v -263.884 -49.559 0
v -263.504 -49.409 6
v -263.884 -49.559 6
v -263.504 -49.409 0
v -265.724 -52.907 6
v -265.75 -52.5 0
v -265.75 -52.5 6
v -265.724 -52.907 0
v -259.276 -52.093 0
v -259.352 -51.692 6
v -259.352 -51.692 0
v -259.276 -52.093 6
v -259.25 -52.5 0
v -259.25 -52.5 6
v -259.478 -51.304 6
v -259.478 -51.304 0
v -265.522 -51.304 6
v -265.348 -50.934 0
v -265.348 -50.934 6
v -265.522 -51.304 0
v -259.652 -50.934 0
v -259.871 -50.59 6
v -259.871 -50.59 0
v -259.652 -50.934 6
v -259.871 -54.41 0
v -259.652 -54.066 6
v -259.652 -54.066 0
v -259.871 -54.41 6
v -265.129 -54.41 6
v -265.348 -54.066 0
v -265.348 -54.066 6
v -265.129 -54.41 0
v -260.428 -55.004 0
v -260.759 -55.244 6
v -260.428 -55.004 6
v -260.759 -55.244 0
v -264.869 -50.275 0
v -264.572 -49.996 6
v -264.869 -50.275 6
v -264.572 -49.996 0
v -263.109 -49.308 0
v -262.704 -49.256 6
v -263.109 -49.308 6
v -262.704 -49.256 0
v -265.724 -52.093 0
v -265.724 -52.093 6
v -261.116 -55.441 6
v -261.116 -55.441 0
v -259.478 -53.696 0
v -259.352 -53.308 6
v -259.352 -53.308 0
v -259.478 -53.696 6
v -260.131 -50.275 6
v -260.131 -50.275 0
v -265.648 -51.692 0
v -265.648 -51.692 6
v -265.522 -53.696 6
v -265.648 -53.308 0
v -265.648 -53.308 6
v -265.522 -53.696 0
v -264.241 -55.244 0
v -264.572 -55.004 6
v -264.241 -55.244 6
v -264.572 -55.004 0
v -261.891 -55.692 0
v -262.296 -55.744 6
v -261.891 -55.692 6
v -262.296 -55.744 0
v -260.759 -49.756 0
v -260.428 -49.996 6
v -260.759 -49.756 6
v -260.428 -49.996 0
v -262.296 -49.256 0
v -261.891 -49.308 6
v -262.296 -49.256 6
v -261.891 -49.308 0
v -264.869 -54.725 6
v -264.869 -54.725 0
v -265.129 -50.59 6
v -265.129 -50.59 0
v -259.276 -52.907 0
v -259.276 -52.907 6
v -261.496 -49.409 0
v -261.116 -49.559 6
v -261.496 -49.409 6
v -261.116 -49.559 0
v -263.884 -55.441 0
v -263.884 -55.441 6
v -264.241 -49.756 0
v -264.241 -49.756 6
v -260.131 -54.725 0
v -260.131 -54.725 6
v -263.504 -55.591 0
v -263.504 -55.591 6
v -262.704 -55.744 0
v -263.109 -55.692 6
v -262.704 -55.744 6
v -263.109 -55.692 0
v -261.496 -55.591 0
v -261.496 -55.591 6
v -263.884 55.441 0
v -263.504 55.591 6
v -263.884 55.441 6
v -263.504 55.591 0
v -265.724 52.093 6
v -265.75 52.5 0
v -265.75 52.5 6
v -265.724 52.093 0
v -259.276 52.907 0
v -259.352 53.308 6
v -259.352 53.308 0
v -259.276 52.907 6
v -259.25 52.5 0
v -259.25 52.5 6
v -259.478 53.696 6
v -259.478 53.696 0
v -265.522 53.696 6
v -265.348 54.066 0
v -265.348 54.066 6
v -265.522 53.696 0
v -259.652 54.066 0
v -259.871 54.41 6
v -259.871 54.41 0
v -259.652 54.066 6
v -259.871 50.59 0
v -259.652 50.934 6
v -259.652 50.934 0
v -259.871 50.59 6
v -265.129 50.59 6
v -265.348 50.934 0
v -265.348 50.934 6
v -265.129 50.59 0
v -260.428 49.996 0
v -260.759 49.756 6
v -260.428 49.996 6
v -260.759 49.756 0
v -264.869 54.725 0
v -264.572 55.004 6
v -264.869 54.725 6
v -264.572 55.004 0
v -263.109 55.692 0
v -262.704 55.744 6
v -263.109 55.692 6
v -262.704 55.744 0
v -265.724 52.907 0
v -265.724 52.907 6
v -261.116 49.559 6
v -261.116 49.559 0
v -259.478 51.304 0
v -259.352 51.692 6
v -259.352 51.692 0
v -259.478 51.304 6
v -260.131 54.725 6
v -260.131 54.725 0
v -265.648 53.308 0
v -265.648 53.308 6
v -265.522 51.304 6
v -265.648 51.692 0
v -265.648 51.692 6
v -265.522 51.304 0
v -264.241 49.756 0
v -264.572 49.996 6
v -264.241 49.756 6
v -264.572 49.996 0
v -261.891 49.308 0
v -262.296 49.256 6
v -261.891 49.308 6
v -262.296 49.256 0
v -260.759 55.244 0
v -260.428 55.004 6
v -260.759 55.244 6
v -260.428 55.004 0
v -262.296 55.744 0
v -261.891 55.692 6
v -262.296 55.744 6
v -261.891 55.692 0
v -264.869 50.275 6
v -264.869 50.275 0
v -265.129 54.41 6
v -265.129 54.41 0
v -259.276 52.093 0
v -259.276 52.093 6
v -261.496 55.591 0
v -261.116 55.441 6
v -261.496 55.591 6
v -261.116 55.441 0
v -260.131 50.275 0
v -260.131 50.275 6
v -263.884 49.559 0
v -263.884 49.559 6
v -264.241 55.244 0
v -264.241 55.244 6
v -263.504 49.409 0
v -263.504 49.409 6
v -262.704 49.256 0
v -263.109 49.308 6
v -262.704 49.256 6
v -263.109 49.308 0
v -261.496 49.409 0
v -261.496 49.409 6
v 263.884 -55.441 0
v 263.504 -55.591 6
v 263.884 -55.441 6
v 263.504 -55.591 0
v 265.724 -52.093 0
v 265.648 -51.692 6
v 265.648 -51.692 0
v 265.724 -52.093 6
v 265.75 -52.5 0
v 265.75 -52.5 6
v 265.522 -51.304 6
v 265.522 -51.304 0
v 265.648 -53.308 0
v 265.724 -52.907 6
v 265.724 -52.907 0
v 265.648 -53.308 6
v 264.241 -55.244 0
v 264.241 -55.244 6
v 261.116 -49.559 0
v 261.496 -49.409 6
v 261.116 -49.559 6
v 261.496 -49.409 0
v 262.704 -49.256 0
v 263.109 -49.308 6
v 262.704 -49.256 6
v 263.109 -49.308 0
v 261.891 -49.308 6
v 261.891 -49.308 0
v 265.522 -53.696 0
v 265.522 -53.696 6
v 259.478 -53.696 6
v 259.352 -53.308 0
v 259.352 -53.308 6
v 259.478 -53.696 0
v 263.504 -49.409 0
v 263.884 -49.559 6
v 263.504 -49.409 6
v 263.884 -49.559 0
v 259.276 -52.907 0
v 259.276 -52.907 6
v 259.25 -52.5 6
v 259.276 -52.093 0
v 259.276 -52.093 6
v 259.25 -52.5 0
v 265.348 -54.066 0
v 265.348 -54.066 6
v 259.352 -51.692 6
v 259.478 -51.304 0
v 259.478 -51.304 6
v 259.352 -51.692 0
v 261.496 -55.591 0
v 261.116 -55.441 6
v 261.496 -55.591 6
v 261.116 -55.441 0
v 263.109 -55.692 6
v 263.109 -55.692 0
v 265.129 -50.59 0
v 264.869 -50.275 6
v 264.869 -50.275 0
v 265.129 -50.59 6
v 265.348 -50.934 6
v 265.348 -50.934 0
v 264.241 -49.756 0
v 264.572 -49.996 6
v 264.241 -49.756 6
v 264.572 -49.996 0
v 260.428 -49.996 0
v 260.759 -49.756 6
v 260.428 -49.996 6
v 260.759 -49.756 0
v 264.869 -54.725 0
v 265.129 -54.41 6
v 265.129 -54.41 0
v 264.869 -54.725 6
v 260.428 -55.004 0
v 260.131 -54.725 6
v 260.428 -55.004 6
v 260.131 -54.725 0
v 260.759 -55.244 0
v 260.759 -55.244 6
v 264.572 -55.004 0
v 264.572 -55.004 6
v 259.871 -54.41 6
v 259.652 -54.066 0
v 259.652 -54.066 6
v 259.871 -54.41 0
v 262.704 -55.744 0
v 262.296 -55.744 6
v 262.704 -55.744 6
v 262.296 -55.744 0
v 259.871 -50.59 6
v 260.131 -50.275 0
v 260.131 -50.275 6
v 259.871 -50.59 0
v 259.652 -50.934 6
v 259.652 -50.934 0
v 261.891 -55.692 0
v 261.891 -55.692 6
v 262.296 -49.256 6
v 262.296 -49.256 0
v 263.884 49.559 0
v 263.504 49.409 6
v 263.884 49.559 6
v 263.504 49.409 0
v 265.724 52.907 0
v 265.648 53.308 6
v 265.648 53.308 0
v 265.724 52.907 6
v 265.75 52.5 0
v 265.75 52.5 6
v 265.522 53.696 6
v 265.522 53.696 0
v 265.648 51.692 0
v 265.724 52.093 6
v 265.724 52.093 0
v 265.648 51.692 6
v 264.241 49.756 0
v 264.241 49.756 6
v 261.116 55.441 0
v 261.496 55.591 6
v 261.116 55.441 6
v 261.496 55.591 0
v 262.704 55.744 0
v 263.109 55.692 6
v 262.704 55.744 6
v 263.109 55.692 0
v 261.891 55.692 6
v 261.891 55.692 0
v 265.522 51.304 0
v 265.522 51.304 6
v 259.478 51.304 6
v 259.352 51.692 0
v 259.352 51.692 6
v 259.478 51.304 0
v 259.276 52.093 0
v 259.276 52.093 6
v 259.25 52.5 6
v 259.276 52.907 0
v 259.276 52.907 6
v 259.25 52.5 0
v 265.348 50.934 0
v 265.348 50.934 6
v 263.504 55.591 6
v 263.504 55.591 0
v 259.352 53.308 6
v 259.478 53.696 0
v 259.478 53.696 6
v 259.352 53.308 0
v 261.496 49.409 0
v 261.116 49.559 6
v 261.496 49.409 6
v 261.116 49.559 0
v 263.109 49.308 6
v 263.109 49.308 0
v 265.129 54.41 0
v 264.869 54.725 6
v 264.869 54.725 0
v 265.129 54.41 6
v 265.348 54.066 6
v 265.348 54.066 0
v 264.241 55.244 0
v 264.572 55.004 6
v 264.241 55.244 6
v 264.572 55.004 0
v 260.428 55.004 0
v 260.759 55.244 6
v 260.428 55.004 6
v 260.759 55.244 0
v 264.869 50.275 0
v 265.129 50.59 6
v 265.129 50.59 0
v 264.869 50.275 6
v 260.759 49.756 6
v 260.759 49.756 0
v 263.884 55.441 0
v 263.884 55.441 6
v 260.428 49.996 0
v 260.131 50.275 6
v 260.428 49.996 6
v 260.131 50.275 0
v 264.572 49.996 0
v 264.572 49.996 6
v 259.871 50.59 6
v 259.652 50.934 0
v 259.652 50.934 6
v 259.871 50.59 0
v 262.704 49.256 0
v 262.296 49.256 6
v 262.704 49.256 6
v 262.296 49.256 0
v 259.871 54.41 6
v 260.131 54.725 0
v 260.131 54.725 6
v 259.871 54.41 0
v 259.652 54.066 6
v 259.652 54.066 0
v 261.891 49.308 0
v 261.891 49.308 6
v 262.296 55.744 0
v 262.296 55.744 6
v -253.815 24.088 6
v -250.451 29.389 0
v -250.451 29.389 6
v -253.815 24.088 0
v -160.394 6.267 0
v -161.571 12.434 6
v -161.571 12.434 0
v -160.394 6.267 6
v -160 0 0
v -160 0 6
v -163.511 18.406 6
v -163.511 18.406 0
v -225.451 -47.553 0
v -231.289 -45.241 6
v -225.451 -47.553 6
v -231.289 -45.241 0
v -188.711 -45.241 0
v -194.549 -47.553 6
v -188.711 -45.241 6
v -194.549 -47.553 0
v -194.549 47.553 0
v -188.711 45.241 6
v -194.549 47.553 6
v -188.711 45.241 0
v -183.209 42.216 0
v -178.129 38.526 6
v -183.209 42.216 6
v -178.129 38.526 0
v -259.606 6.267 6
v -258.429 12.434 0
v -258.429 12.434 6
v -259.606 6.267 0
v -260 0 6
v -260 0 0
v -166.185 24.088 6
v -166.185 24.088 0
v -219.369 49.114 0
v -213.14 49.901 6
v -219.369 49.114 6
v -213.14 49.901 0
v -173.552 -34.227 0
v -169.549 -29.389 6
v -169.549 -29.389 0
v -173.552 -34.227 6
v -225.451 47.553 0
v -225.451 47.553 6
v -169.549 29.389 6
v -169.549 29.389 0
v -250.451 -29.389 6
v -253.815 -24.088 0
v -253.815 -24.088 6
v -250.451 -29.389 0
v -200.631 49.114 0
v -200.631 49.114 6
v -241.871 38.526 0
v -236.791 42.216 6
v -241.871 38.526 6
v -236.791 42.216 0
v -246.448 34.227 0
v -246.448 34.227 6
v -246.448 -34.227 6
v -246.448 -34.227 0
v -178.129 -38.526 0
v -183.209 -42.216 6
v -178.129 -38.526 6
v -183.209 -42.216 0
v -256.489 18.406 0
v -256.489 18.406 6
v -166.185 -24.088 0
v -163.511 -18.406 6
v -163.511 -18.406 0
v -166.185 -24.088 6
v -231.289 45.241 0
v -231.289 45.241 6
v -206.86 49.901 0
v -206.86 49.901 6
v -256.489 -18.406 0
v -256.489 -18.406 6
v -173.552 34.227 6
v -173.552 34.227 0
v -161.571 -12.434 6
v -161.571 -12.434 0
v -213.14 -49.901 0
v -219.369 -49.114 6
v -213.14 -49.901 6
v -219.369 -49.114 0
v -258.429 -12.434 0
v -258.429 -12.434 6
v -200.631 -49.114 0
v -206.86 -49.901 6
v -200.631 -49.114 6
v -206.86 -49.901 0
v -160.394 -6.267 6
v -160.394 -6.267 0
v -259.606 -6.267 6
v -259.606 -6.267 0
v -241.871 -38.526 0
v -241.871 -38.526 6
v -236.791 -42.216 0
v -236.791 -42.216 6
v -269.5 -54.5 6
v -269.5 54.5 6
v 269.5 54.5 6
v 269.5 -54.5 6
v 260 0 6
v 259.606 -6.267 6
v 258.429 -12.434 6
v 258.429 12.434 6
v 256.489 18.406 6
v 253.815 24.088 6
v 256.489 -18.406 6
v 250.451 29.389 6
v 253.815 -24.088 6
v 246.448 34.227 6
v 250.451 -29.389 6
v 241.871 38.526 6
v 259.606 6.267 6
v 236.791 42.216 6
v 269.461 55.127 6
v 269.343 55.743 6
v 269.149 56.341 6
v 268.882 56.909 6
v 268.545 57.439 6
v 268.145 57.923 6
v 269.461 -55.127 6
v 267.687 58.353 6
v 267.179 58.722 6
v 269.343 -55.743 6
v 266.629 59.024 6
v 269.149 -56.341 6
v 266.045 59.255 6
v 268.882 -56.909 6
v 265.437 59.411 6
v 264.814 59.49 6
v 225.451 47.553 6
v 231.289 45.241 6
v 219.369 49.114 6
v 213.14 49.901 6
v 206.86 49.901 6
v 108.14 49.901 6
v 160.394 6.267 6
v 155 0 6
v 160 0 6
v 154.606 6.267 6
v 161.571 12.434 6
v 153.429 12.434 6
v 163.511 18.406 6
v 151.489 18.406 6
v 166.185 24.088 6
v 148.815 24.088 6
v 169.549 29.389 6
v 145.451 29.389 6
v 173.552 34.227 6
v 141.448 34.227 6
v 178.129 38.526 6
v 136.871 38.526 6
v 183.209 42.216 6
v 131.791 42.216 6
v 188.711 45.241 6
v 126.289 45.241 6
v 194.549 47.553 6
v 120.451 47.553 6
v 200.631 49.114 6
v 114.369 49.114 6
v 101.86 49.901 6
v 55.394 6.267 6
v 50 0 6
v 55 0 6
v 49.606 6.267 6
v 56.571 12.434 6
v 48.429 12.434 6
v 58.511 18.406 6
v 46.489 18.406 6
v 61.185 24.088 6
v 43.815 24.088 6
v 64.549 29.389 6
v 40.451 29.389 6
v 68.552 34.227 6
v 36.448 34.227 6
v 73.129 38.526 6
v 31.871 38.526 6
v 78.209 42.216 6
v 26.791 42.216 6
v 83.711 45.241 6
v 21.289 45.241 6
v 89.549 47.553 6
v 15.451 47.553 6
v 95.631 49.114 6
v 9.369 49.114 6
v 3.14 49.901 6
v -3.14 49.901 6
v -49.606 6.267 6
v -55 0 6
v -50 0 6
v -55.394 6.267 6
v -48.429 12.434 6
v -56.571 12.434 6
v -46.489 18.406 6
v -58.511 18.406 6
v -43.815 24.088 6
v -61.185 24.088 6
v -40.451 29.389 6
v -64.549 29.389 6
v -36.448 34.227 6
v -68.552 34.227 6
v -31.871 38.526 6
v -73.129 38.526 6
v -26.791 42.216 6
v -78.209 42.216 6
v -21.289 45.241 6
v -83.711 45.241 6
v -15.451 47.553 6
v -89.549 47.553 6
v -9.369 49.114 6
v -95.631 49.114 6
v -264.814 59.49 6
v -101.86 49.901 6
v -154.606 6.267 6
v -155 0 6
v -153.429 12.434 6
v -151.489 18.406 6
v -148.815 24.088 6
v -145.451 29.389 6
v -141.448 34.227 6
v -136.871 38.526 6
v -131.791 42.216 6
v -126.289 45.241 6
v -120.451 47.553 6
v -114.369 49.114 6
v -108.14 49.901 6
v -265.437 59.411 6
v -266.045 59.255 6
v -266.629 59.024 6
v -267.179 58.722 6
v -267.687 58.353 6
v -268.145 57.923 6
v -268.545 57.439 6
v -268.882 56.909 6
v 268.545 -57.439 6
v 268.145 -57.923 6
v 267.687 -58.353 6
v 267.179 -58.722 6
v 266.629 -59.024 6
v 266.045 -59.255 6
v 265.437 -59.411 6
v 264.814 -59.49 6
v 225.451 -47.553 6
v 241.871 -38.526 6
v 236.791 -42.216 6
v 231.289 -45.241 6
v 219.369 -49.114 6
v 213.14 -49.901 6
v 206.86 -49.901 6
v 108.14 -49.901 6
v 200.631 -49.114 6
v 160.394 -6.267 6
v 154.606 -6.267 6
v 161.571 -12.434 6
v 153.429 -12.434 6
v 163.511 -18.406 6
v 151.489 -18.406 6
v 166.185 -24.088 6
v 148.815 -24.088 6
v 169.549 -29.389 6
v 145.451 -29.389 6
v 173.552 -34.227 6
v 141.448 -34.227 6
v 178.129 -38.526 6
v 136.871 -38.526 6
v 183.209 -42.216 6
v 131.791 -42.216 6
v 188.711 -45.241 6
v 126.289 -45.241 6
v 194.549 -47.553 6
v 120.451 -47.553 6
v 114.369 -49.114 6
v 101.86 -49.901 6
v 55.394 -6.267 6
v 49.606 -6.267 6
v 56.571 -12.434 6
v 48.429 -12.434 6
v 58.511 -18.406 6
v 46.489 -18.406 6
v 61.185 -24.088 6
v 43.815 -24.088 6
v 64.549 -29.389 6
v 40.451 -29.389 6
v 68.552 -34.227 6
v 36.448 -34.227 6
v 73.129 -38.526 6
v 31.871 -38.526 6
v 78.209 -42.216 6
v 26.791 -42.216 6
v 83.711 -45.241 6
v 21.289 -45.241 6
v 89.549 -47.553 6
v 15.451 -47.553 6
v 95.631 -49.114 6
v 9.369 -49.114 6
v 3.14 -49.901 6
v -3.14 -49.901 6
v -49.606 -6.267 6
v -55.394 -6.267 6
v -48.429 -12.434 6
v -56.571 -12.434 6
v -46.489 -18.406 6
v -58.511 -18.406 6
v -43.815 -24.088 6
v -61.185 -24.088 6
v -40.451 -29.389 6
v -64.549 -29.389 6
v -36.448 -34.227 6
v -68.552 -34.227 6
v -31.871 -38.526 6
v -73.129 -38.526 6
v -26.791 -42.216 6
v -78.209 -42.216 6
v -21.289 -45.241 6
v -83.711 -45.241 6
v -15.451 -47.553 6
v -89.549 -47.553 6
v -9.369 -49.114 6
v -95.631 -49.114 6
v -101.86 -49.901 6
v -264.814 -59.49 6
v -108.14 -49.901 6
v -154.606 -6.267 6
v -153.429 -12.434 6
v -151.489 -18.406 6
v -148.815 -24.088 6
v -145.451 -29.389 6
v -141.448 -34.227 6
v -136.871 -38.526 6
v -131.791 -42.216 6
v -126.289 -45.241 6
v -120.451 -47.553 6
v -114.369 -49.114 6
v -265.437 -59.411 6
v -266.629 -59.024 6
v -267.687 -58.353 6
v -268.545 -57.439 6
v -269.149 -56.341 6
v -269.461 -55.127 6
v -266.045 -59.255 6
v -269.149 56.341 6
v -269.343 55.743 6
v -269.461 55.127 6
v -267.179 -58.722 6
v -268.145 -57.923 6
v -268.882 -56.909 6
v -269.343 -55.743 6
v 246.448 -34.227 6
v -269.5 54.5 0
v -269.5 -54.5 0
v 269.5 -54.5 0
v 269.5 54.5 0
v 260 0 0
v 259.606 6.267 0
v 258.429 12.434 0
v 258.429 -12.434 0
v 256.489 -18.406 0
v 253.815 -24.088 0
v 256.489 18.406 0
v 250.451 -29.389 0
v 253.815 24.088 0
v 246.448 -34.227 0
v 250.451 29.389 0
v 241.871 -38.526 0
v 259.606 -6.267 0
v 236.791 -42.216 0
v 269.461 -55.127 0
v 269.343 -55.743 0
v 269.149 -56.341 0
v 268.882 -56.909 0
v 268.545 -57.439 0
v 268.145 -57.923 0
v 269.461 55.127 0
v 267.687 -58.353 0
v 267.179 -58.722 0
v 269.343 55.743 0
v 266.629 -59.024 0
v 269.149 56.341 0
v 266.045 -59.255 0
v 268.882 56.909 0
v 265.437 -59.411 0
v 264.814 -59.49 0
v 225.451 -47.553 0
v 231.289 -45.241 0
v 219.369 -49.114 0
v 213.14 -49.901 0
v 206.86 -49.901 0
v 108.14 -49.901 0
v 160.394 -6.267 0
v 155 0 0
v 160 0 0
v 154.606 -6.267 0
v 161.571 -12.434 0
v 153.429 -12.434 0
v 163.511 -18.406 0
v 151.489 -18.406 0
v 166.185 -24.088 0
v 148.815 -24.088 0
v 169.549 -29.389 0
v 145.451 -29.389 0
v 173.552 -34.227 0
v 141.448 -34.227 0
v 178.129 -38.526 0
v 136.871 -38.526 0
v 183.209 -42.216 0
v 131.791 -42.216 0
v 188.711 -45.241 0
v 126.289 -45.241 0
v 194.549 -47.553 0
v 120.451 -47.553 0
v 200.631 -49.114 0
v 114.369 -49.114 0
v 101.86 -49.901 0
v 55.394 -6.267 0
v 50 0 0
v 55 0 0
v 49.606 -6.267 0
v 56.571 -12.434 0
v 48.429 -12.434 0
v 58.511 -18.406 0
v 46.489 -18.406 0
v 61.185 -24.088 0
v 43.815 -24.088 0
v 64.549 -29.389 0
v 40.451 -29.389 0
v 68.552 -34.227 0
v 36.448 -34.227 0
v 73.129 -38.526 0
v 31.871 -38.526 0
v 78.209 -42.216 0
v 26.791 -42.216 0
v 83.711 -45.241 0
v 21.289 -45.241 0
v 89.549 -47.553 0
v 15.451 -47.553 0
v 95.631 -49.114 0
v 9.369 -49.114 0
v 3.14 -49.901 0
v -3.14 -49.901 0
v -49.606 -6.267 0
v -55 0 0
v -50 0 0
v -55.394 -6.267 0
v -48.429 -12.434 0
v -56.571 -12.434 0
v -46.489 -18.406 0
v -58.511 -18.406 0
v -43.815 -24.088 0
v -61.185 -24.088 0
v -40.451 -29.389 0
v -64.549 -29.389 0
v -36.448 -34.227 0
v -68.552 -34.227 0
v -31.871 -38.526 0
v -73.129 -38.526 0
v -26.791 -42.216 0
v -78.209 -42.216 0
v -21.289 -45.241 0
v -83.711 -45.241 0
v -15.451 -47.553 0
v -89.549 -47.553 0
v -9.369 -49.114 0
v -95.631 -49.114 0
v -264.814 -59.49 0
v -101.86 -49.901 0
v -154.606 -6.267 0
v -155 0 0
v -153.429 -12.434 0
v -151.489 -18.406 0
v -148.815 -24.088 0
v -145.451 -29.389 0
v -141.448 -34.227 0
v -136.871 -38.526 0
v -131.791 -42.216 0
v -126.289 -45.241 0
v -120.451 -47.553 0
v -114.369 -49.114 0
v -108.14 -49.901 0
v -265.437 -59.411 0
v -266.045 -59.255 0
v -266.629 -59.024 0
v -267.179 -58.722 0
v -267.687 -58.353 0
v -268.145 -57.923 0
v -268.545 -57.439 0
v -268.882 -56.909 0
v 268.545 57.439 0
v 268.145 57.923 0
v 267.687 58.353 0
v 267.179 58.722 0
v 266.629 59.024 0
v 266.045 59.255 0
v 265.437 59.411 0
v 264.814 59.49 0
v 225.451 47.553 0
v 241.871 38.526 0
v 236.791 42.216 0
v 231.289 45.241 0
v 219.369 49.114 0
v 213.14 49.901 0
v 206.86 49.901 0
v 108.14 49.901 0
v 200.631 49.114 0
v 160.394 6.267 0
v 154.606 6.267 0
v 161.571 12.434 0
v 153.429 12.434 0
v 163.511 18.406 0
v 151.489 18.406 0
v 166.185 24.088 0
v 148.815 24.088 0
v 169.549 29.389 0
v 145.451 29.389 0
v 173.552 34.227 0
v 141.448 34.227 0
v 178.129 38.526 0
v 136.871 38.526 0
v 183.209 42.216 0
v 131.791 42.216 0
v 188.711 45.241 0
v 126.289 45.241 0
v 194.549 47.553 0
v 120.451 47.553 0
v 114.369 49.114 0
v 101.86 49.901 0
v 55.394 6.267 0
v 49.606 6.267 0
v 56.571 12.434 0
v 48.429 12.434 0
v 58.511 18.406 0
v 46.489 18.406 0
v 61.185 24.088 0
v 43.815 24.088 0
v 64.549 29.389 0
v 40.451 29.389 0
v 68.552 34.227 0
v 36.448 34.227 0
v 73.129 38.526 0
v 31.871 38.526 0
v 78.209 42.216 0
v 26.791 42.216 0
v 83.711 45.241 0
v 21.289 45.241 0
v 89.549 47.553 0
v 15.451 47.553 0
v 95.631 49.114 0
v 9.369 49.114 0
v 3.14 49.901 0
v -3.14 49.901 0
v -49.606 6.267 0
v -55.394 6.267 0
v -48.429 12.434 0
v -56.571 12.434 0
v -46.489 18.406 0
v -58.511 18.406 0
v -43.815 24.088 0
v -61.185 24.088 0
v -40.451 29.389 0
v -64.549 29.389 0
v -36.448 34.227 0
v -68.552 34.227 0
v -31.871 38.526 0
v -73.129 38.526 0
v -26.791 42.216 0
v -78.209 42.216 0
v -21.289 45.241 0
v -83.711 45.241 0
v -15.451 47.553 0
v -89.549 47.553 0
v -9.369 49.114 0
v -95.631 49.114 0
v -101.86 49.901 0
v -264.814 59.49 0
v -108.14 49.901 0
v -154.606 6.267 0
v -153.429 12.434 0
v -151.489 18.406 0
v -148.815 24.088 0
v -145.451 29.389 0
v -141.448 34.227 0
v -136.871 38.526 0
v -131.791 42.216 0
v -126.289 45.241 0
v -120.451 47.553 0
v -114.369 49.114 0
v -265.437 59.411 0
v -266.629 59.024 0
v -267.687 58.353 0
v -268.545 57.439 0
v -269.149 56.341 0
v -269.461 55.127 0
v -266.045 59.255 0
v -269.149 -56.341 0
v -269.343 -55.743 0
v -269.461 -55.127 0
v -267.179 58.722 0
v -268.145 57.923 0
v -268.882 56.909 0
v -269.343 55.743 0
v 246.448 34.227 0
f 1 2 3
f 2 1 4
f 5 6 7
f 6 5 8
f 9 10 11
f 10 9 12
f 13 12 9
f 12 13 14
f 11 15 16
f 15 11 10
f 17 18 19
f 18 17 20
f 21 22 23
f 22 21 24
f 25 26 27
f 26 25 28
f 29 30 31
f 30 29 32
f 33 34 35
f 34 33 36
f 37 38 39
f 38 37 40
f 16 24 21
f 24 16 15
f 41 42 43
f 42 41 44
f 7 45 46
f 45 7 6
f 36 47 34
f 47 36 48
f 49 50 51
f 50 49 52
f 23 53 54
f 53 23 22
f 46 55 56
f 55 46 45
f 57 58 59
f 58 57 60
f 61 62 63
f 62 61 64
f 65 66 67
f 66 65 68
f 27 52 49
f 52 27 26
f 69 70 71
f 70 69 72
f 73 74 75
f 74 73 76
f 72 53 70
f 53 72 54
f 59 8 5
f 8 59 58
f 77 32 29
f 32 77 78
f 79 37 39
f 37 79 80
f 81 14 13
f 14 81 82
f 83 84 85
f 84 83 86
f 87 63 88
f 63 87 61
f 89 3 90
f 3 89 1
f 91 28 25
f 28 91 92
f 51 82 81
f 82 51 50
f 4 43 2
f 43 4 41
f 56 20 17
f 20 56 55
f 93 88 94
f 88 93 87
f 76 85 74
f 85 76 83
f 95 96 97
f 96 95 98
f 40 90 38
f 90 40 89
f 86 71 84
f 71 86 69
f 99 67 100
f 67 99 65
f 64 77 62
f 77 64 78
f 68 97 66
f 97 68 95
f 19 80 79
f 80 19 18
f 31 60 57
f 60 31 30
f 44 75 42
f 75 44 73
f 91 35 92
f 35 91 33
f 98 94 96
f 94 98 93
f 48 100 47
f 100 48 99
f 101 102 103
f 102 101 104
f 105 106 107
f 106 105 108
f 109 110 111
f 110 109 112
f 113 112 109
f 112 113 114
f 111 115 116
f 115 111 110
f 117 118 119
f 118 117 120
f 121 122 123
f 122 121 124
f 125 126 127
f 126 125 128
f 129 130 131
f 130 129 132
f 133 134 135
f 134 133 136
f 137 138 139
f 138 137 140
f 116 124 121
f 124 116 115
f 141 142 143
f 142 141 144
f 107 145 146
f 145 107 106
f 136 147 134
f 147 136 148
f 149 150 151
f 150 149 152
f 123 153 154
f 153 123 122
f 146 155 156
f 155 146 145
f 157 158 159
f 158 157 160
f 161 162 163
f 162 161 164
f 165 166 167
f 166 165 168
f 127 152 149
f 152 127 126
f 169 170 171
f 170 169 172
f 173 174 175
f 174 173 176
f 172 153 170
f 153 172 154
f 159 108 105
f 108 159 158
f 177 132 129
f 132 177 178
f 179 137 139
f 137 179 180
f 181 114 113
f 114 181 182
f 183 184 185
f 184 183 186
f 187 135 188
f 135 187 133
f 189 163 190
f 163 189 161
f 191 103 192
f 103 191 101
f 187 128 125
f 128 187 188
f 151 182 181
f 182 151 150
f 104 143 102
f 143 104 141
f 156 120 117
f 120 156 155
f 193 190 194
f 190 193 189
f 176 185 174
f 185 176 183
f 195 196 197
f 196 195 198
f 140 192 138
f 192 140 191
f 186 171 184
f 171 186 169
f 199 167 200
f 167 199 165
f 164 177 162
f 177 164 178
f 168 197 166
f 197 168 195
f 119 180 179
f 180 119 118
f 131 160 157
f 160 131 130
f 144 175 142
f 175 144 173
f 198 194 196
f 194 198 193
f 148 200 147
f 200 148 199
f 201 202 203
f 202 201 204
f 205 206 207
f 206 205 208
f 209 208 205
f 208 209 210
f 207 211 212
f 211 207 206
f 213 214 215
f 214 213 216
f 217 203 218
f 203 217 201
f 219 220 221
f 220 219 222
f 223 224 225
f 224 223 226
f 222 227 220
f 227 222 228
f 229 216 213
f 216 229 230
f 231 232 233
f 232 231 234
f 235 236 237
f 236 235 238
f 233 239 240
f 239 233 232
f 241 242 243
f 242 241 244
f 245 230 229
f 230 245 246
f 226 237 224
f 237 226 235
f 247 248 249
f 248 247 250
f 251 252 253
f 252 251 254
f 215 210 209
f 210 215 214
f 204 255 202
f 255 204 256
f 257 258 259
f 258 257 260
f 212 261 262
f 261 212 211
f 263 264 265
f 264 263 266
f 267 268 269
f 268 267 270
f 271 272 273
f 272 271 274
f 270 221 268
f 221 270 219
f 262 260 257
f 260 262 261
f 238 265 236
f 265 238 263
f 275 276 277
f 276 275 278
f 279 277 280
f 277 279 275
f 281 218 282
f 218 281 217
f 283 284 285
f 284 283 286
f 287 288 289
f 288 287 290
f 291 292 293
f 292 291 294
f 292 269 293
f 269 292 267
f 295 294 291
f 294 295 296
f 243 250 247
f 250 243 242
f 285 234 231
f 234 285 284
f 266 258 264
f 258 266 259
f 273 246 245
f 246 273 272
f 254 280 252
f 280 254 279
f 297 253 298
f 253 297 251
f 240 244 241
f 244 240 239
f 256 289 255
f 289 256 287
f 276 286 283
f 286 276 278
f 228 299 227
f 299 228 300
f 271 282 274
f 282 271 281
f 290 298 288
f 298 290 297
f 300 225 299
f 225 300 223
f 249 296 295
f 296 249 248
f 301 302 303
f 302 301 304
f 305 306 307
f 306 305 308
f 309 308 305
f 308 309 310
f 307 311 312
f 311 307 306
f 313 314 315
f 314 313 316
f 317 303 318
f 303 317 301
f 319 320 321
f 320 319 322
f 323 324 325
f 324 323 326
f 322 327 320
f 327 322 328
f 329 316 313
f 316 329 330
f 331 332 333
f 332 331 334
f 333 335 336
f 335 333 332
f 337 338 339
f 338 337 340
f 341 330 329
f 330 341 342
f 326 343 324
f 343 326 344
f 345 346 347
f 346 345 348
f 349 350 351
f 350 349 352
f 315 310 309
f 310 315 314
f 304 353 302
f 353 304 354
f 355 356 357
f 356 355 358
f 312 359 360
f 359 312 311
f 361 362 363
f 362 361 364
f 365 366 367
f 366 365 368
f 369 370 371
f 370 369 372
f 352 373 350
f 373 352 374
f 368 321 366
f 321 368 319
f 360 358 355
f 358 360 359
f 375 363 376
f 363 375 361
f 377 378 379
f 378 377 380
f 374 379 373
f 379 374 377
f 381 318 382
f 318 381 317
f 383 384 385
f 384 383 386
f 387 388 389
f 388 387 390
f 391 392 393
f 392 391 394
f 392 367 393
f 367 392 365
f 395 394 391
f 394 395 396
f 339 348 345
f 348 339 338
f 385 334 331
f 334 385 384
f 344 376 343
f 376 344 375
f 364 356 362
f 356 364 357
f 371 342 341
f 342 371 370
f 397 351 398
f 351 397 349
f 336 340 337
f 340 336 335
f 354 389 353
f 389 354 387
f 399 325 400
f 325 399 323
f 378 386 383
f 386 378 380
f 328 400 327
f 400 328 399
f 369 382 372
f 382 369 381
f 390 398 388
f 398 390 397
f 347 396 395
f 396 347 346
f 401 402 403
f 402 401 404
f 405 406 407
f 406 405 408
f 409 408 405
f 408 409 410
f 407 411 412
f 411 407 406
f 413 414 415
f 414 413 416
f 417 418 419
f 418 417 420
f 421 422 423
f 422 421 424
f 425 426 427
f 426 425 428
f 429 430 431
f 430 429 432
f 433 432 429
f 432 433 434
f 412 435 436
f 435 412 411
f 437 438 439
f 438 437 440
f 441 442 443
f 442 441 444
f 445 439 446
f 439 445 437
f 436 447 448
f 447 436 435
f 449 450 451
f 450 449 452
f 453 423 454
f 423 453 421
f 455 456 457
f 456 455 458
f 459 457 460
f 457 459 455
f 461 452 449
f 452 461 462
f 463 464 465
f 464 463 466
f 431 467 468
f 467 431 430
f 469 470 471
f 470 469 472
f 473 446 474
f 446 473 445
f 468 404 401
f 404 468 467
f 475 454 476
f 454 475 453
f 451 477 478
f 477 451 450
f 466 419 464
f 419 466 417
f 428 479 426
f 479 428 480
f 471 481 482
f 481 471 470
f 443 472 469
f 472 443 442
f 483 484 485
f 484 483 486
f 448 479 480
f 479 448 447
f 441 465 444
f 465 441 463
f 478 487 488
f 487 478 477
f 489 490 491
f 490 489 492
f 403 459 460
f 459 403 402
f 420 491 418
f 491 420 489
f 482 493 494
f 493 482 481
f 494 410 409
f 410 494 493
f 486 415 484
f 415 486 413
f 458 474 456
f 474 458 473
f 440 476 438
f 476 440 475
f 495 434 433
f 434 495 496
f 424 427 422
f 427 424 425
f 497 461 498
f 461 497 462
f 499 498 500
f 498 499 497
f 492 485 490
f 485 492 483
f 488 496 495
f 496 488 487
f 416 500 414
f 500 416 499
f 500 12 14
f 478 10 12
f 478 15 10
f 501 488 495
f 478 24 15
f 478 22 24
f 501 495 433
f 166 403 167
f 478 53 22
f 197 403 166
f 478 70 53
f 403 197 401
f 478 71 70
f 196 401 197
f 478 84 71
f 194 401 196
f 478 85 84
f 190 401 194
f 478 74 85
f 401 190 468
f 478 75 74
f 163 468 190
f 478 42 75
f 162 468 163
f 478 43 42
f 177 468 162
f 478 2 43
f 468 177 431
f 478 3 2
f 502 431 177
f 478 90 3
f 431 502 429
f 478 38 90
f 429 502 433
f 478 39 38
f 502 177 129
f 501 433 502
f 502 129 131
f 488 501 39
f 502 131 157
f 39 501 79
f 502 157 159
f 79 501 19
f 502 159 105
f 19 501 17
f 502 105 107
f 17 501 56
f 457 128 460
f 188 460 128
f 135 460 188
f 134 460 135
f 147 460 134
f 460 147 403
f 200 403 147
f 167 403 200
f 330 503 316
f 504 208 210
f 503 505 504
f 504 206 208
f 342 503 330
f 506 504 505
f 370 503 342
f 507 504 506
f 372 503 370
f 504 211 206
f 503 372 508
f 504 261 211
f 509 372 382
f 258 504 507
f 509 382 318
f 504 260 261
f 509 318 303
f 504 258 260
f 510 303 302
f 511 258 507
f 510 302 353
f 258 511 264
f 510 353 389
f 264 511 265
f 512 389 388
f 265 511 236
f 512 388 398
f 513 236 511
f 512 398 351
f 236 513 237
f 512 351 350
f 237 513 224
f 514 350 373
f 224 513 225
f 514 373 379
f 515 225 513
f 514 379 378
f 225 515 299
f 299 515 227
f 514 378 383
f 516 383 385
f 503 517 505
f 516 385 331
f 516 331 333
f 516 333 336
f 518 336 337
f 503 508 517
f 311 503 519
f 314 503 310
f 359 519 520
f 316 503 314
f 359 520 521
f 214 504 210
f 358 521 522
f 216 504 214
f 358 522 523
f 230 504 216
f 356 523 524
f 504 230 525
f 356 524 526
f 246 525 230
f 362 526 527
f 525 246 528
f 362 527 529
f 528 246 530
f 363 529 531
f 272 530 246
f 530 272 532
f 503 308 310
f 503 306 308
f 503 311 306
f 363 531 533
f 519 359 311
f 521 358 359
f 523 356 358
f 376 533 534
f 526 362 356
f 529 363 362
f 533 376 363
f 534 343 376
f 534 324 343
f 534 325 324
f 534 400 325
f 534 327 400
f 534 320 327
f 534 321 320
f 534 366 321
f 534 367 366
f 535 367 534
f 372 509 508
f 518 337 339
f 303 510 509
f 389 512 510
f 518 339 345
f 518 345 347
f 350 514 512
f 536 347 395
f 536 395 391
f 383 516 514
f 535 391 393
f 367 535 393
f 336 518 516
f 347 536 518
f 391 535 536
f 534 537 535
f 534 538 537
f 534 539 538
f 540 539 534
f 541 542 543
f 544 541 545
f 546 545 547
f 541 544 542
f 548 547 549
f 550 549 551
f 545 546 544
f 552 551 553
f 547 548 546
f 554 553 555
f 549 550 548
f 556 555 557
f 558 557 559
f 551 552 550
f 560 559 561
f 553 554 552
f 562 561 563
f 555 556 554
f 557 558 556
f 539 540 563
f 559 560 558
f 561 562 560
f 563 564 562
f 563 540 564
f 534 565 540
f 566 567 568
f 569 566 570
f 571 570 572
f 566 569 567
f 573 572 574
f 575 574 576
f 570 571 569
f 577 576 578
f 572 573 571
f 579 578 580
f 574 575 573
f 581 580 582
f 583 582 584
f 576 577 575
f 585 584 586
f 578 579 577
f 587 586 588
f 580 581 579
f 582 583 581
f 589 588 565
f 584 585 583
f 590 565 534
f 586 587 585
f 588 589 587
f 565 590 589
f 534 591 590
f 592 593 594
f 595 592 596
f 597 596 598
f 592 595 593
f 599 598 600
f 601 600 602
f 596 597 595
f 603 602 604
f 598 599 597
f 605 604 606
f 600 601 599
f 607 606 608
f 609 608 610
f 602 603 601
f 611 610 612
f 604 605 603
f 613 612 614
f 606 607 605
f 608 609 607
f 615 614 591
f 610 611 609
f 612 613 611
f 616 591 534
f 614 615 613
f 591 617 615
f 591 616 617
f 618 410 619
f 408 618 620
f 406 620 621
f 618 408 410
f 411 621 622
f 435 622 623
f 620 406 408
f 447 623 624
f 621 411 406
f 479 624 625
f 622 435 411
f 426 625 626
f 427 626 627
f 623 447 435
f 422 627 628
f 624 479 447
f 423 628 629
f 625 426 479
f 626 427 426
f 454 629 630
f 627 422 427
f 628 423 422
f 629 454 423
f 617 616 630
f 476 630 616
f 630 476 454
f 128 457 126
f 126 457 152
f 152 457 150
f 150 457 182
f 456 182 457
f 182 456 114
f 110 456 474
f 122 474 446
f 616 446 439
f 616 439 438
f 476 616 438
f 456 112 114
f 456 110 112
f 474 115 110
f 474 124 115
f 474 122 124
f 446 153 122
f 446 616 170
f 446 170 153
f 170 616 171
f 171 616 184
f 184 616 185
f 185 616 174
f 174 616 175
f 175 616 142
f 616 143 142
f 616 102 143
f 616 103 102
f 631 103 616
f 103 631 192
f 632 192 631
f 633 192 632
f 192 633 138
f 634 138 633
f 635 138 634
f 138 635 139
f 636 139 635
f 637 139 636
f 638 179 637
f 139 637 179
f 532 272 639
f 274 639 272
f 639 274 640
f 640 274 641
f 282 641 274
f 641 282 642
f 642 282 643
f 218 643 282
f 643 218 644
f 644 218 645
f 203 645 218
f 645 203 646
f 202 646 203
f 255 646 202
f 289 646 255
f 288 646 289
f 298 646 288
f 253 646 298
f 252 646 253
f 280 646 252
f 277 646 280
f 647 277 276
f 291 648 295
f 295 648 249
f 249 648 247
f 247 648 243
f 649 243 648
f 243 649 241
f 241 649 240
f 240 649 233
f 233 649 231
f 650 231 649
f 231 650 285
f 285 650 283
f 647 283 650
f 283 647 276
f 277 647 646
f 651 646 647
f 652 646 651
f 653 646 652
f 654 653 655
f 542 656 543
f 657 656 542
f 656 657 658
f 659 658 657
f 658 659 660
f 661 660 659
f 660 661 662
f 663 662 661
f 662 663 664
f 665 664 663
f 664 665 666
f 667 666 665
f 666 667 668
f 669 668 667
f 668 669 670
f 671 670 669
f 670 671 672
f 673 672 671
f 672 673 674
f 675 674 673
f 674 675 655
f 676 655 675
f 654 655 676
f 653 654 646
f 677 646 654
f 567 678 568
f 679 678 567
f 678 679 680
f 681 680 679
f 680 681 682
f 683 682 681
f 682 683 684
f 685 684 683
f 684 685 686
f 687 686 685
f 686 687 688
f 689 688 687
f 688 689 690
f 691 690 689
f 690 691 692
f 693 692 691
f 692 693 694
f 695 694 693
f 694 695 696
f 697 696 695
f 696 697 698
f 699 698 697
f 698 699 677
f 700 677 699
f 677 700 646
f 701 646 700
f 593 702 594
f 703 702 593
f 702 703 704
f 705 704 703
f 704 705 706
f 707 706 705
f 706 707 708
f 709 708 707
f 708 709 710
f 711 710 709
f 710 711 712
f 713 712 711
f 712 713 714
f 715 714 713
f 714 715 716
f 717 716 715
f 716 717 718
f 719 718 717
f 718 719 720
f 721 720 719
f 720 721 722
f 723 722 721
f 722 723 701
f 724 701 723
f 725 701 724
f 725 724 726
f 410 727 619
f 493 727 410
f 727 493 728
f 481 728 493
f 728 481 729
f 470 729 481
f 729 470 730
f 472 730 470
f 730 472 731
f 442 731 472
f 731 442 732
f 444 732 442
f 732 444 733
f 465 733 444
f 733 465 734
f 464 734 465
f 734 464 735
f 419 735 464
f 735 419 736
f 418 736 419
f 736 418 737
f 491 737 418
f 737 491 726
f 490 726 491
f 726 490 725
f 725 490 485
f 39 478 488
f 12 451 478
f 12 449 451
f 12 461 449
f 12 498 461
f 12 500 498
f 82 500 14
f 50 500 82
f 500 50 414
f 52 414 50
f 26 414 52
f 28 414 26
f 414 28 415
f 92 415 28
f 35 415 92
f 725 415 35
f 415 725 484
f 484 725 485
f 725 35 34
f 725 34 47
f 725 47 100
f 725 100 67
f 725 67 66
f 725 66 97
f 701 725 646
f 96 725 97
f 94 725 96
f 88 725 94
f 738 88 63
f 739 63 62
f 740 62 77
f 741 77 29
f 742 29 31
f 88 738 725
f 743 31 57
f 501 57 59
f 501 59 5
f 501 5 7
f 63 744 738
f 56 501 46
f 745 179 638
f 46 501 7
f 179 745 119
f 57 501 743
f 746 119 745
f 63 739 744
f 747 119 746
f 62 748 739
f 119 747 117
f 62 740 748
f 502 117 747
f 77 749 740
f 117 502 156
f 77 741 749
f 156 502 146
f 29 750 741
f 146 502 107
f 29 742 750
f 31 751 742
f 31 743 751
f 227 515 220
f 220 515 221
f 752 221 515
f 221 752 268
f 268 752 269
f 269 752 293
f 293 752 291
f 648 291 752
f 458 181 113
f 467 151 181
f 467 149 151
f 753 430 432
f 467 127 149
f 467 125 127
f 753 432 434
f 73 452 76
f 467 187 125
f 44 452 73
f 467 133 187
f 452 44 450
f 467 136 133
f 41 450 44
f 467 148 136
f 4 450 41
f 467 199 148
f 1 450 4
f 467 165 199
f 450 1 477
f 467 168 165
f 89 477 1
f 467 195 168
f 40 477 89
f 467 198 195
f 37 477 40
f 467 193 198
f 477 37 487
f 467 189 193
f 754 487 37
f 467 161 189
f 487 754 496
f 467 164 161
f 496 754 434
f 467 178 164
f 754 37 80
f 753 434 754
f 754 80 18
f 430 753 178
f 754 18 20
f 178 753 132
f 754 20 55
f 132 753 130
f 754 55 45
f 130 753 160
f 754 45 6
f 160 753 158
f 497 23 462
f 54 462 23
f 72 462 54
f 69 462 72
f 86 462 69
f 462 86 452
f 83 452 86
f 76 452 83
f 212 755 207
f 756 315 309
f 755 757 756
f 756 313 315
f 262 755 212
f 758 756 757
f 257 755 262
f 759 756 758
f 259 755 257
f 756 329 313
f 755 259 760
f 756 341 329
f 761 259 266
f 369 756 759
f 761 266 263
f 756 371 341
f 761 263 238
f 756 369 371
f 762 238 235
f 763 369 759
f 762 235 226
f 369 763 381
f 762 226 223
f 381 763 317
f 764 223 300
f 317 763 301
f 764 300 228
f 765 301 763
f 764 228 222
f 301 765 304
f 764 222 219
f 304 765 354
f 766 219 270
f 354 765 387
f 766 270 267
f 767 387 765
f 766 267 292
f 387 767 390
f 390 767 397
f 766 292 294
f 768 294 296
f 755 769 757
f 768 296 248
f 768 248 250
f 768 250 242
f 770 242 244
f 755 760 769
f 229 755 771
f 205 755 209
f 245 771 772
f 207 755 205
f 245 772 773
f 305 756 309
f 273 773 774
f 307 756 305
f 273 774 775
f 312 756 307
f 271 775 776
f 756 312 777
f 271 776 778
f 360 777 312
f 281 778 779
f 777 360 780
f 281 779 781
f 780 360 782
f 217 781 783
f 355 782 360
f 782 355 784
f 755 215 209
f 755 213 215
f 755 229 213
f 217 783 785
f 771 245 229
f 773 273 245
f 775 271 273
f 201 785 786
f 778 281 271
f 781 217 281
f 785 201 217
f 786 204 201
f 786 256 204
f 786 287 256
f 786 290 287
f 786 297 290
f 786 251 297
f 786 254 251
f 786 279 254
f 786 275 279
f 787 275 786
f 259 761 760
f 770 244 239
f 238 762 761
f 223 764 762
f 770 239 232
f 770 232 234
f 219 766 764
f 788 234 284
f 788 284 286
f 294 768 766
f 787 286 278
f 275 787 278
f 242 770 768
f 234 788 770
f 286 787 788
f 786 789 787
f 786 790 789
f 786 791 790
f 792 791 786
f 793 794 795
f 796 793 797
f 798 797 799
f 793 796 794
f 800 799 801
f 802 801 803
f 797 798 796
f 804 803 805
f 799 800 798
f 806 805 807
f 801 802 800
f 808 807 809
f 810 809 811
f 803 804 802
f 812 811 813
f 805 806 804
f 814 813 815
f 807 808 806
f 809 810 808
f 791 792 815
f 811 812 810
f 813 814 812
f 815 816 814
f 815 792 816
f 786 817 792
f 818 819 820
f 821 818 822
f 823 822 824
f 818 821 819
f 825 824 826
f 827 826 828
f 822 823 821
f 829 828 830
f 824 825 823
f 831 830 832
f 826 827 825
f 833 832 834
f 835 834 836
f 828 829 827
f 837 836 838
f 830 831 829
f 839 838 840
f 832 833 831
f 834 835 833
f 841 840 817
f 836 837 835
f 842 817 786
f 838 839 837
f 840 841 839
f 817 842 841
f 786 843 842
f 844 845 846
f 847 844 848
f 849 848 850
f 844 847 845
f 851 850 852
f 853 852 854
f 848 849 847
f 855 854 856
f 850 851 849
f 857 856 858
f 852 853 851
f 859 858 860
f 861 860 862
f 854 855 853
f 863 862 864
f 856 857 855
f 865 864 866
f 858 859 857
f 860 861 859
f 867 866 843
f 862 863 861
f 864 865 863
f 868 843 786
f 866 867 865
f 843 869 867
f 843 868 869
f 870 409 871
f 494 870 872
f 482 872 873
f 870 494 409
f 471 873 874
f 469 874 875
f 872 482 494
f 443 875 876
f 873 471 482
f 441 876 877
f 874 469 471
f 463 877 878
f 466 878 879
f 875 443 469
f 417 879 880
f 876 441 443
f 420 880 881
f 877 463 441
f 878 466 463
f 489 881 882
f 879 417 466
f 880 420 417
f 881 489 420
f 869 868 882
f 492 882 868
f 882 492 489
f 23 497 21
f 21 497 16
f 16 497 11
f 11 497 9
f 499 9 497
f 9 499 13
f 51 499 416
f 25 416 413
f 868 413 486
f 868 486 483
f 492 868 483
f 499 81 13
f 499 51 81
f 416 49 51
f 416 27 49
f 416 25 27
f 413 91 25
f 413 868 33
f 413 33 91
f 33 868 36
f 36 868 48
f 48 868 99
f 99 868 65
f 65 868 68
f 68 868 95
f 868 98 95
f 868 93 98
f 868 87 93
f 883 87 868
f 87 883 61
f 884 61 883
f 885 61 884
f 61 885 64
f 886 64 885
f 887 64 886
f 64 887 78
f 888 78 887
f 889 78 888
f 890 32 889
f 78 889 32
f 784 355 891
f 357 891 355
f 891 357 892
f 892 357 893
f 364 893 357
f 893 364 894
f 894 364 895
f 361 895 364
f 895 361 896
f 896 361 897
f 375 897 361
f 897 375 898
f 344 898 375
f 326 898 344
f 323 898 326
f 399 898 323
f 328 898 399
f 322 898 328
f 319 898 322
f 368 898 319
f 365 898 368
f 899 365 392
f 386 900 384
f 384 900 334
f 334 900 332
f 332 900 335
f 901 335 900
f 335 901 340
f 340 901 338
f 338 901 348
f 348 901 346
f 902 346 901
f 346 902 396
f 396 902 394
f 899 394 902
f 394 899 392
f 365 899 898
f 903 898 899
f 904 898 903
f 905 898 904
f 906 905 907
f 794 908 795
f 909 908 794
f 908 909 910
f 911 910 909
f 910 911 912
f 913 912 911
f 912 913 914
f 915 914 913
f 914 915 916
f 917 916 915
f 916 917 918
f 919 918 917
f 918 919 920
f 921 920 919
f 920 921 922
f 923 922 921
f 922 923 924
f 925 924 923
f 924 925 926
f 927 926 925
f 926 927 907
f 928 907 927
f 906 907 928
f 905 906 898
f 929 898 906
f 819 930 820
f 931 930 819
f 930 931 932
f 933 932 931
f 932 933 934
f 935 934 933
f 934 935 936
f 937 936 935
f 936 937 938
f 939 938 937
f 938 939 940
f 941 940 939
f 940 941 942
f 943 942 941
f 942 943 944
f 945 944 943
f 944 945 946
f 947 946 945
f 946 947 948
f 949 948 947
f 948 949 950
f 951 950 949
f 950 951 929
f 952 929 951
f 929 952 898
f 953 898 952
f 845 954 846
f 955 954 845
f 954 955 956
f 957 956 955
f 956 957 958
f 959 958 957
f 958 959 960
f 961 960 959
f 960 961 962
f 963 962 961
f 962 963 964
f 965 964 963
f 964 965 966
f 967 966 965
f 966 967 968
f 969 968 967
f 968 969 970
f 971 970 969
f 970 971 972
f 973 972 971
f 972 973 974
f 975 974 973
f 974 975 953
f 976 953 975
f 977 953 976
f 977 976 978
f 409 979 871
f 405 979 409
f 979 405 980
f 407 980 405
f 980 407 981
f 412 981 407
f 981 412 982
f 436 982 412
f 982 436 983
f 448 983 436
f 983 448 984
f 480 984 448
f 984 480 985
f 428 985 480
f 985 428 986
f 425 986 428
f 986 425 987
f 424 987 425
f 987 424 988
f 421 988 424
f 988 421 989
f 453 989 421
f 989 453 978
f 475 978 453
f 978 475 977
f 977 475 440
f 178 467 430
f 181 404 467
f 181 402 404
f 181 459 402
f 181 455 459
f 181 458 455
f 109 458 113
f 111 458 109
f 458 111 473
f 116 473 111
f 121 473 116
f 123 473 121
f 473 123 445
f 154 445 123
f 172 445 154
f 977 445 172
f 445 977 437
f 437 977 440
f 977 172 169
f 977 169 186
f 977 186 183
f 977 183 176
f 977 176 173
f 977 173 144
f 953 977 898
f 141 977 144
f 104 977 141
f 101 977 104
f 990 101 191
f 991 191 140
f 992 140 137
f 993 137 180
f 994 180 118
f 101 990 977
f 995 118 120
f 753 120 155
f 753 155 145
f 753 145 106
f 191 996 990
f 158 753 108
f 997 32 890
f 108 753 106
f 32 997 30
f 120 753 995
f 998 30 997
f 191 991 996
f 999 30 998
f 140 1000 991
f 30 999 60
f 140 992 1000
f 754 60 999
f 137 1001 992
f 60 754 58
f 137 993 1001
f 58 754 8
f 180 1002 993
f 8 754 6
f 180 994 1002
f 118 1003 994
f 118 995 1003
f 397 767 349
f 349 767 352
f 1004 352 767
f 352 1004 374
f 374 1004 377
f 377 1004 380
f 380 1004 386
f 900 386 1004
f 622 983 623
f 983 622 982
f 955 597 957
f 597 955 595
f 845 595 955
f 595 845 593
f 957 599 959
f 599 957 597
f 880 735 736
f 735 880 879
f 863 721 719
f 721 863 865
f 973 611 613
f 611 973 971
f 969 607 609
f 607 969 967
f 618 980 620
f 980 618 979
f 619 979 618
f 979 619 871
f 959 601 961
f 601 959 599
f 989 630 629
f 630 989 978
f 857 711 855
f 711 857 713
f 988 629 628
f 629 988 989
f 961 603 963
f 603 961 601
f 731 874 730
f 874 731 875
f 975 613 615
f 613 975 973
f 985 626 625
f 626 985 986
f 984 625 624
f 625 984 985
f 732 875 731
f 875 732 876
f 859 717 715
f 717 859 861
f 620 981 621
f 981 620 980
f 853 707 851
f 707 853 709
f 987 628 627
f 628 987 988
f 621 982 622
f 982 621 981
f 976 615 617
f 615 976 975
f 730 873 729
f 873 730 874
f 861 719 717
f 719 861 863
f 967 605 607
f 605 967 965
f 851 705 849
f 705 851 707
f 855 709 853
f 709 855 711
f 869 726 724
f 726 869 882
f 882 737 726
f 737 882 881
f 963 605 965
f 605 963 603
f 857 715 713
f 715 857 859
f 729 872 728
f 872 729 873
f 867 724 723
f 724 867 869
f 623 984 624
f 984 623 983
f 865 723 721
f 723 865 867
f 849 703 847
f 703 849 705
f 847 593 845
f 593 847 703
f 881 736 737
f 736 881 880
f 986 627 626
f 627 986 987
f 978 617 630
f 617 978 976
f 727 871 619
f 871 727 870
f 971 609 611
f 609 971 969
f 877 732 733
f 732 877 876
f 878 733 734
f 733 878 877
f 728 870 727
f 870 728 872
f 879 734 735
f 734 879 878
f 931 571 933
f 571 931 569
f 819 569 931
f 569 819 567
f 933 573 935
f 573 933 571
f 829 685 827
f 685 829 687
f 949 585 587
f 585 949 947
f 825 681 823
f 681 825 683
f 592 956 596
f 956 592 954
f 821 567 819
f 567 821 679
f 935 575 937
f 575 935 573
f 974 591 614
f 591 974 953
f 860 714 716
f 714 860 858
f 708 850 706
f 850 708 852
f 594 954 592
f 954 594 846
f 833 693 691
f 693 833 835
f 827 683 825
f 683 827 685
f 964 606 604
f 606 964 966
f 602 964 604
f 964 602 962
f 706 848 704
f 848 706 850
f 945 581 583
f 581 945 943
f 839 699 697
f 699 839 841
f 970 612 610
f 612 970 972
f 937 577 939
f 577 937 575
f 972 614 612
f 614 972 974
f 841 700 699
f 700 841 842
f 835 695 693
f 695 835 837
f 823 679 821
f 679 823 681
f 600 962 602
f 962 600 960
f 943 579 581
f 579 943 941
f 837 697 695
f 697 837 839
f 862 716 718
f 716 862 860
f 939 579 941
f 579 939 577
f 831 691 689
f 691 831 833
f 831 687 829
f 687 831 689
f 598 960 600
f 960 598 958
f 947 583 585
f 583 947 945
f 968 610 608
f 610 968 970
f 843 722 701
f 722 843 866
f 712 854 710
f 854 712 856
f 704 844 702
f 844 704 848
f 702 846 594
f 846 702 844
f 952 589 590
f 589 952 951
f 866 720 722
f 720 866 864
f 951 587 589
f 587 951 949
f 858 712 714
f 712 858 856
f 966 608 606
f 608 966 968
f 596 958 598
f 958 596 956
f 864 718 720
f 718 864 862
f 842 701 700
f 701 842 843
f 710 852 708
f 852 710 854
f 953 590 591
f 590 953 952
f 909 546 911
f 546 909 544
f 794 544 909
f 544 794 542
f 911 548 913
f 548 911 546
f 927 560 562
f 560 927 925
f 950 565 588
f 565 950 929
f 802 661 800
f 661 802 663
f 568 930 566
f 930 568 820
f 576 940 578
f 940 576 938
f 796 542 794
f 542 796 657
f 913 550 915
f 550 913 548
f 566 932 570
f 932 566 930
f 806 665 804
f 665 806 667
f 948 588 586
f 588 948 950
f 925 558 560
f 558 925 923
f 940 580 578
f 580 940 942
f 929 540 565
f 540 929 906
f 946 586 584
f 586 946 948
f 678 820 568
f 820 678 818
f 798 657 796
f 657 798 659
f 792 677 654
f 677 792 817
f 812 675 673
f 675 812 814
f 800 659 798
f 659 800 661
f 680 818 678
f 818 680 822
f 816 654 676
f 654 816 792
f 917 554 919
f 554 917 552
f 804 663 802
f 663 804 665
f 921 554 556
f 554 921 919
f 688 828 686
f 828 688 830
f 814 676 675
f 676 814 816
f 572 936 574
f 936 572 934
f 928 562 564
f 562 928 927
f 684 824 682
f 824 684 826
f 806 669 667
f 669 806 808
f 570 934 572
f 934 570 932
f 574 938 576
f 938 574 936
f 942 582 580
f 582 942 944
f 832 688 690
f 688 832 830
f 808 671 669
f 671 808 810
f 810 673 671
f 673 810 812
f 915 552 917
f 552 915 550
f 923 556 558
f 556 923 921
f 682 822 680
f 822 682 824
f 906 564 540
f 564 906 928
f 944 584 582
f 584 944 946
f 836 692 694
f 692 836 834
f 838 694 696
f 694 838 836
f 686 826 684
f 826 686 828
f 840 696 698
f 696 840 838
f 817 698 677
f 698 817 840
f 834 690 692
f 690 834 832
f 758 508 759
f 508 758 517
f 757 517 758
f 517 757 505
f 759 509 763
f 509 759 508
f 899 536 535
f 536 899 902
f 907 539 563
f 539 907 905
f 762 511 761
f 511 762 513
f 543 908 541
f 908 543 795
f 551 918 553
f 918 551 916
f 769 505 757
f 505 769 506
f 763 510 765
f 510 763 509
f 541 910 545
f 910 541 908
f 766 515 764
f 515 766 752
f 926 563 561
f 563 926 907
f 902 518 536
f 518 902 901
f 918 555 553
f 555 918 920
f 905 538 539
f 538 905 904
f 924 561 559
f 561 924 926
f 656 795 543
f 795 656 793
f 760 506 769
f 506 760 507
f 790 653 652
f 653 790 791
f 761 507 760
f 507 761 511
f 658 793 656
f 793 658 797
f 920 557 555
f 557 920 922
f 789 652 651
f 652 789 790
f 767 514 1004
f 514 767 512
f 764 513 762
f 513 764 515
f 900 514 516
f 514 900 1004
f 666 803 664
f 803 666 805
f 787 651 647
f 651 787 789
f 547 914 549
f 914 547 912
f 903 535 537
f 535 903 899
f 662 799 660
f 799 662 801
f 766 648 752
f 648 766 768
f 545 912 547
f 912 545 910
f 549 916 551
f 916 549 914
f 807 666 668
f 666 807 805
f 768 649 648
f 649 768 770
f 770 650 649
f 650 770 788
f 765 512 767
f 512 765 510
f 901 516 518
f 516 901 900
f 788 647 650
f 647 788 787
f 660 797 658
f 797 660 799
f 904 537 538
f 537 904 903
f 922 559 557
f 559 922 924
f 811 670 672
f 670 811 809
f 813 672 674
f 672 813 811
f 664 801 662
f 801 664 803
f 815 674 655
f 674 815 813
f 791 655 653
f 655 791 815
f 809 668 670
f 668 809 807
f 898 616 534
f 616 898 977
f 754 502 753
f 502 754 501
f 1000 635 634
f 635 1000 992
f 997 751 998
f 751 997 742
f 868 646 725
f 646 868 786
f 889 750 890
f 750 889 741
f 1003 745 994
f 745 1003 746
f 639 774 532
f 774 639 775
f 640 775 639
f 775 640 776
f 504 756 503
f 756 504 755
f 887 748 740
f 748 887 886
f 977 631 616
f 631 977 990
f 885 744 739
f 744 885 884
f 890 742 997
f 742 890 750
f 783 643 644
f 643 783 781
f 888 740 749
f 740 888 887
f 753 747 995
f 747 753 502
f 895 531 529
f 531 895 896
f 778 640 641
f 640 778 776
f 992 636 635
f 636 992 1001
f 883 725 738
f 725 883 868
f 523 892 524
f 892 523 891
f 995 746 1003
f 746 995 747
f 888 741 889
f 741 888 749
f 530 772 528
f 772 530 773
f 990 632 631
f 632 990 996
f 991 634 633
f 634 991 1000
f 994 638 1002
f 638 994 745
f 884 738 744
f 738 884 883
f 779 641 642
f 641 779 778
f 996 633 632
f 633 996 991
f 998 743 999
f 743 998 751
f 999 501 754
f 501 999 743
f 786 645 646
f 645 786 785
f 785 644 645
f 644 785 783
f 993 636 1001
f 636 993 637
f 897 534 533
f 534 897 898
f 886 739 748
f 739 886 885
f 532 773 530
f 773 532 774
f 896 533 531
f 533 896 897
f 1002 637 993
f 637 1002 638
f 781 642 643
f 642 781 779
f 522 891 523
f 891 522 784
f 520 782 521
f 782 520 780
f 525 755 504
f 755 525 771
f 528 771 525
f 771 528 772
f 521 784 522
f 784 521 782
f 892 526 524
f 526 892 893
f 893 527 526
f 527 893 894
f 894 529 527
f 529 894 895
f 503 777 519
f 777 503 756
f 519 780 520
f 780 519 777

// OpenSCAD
$fn = 50;


difference() {
	union() {
		hull() {
			translate(v = [-264.5000000000, 54.5000000000, 0]) {
				cylinder(h = 6, r = 5);
			}
			translate(v = [264.5000000000, 54.5000000000, 0]) {
				cylinder(h = 6, r = 5);
			}
			translate(v = [-264.5000000000, -54.5000000000, 0]) {
				cylinder(h = 6, r = 5);
			}
			translate(v = [264.5000000000, -54.5000000000, 0]) {
				cylinder(h = 6, r = 5);
			}
		}
	}
	union() {
		#translate(v = [-262.5000000000, -52.5000000000, -100.0000000000]) {
			cylinder(h = 200, r = 3.2500000000);
		}
		#translate(v = [-262.5000000000, 52.5000000000, -100.0000000000]) {
			cylinder(h = 200, r = 3.2500000000);
		}
		#translate(v = [262.5000000000, -52.5000000000, -100.0000000000]) {
			cylinder(h = 200, r = 3.2500000000);
		}
		#translate(v = [262.5000000000, 52.5000000000, -100.0000000000]) {
			cylinder(h = 200, r = 3.2500000000);
		}
		#translate(v = [-210.0000000000, 0, 0]) {
			cylinder(h = 6, r = 50.0000000000);
		}
		#translate(v = [-105.0000000000, 0, 0]) {
			cylinder(h = 6, r = 50.0000000000);
		}
		#cylinder(h = 6, r = 50.0000000000);
		#translate(v = [105.0000000000, 0, 0]) {
			cylinder(h = 6, r = 50.0000000000);
		}
		#translate(v = [210.0000000000, 0, 0]) {
			cylinder(h = 6, r = 50.0000000000);
		}
	}
}
